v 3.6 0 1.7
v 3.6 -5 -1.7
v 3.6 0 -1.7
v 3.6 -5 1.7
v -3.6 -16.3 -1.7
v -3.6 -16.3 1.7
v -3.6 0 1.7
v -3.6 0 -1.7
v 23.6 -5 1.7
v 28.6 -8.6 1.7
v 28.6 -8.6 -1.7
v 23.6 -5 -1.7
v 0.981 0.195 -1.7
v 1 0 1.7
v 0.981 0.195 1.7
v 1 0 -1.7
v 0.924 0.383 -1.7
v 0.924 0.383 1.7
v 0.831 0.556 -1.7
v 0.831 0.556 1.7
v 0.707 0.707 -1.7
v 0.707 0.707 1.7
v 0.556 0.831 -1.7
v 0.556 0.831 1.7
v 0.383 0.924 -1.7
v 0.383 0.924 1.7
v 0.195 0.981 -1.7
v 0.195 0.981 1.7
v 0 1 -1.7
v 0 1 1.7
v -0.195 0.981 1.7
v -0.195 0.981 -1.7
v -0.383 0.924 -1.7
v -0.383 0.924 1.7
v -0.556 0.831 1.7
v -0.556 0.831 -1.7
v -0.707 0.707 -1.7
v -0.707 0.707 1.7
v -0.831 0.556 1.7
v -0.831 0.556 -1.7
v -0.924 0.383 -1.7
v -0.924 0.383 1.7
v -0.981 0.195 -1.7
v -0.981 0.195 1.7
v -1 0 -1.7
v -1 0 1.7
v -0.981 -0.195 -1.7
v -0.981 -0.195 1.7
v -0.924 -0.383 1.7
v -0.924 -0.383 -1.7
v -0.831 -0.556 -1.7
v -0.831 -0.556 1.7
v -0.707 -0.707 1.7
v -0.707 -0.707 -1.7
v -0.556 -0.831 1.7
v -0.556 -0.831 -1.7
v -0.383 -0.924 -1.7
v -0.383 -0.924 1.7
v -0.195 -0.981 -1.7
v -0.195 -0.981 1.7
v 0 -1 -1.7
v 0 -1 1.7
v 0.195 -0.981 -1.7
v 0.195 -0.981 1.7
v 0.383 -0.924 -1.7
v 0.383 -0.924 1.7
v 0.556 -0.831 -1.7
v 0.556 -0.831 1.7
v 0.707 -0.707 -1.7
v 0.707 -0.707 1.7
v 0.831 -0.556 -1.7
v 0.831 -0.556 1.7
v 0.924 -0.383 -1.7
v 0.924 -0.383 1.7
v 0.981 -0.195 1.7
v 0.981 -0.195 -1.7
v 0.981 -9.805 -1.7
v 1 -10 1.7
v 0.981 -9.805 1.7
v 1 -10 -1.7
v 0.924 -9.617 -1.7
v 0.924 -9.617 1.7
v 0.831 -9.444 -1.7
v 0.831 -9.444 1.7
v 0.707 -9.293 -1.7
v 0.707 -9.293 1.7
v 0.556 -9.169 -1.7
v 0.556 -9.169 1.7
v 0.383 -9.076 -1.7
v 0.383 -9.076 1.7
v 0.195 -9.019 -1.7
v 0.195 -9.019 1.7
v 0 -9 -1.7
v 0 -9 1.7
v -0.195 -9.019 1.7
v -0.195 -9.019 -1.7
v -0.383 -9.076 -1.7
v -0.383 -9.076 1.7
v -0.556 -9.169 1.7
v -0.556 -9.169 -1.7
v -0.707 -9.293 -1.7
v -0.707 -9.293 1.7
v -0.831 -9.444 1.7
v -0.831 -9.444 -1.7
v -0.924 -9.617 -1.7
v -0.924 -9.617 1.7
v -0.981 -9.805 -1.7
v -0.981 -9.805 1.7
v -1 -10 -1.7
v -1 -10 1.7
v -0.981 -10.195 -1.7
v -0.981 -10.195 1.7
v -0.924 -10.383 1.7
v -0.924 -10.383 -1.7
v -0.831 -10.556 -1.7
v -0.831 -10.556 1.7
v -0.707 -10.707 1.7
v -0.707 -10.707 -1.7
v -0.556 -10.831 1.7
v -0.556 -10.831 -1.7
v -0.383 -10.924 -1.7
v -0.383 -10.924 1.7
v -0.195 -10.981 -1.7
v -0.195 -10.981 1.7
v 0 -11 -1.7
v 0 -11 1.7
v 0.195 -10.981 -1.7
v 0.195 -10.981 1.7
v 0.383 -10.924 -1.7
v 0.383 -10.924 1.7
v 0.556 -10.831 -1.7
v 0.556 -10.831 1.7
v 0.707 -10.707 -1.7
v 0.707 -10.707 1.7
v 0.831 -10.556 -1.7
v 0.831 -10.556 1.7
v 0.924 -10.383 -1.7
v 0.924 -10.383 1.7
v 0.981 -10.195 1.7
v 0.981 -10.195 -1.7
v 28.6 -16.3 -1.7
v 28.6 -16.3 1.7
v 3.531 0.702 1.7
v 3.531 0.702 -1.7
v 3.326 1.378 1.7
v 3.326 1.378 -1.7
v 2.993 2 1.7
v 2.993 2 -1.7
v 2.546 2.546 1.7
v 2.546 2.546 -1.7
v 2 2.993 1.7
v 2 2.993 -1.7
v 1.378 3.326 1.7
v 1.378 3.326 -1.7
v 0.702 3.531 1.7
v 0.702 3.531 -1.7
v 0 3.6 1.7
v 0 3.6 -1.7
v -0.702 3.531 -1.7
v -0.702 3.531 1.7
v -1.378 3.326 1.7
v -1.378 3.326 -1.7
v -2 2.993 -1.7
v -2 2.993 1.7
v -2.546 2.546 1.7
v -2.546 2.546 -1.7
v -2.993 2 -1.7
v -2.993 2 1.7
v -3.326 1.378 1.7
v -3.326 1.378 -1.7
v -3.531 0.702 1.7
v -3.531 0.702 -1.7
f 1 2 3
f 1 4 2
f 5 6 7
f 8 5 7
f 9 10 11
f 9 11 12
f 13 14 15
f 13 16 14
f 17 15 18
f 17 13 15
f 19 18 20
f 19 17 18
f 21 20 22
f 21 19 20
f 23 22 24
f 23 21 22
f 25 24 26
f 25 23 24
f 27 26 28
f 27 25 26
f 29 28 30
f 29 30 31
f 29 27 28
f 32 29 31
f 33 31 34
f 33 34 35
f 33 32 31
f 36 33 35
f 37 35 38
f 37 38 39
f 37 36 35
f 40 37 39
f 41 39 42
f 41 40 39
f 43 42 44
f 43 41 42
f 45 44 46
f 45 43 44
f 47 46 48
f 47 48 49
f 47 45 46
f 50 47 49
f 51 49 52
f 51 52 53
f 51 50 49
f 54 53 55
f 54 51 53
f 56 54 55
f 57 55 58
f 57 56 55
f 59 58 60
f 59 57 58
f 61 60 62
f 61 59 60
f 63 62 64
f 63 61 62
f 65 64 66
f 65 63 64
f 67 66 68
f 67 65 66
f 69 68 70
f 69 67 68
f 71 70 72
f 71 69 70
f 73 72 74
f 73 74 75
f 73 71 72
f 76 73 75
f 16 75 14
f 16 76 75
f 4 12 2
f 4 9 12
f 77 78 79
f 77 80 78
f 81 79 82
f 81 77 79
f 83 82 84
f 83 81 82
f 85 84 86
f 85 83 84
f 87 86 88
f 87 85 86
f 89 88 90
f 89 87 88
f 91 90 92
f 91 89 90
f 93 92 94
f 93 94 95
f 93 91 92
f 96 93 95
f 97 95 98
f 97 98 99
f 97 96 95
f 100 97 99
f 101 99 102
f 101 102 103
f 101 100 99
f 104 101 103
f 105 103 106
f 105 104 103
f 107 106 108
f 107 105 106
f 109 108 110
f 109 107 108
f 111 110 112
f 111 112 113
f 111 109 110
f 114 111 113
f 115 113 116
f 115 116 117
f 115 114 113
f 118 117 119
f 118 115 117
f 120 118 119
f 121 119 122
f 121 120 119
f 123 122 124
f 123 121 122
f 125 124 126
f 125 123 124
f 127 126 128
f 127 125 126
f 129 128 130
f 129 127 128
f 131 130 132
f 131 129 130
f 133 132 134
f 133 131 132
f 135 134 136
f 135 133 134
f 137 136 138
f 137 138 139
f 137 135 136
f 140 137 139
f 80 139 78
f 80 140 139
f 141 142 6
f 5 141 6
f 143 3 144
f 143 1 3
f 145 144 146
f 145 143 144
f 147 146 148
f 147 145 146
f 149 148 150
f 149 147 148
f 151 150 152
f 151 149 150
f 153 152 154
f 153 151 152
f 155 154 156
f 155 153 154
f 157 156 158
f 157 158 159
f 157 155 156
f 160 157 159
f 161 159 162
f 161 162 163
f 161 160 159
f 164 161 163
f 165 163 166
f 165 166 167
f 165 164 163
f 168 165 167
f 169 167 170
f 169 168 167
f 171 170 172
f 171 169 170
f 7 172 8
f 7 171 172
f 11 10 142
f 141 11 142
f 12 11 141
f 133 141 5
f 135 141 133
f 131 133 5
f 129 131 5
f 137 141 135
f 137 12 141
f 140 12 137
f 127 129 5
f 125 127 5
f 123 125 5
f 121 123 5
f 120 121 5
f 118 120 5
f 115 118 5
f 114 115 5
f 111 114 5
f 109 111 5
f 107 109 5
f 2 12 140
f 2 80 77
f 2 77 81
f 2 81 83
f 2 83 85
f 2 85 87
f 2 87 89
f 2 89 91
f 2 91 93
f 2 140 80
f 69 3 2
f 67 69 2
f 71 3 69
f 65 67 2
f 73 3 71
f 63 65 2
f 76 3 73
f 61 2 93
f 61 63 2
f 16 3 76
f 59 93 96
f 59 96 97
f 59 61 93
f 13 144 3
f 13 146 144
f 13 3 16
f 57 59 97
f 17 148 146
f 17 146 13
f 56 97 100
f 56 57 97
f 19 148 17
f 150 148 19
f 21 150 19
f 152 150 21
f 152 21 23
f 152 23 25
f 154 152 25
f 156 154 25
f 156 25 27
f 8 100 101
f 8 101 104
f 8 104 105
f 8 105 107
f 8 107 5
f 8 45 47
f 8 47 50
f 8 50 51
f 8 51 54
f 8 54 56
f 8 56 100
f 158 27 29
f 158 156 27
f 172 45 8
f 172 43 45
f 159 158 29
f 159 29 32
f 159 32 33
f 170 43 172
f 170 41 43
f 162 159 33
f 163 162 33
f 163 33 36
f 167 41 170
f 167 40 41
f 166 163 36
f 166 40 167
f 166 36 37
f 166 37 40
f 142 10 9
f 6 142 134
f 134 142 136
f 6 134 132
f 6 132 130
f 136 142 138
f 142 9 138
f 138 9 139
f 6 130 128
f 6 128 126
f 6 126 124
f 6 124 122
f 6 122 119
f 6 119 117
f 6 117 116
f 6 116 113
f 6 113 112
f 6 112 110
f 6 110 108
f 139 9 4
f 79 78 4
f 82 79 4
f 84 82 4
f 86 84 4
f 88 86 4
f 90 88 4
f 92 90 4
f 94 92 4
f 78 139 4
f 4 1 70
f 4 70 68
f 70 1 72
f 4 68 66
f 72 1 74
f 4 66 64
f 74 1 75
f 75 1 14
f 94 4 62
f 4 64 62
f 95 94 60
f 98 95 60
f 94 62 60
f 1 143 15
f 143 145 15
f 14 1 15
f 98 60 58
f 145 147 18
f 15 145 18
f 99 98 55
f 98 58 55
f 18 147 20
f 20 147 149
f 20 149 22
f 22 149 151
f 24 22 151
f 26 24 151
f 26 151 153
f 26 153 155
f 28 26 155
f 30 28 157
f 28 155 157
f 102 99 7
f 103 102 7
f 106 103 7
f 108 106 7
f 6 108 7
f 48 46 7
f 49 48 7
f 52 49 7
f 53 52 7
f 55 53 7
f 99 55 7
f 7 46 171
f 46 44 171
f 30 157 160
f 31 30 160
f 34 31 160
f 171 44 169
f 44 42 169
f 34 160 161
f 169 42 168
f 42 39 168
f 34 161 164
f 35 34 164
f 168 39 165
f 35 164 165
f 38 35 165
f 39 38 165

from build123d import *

# Parameters (mm, degrees)
CROQUIS1_R              = 1
SALIENTE_EXTRUIR1_DEPTH = 1.7
CROQUIS3_W              = 15
CROQUIS3_H              = 10.99
SALIENTE_EXTRUIR2_DEPTH = 3.4
CROQUIS4_W              = 15
CROQUIS4_H              = 3.4
CORTAR_EXTRUIR1_DEPTH   = 10.99
SALIENTE_EXTRUIR3_DEPTH = 3.4


with BuildPart() as part:
    # Croquis1 → Saliente-Extruir1 (new, symmetric)
    with BuildSketch(Plane.XY):
        with BuildLine():
            Line((-3.6, 0), (-3.6, -10))
            ThreePointArc((-3.6, -10), (-2.545584412, -12.545584412), (0, -13.6))
            Line((0, -13.6), (28.6, -13.6))
            Line((28.6, -13.6), (28.6, -8.6))
            Line((28.6, -8.6), (23.6, -5))
            Line((23.6, -5), (3.6, -5))
            Line((3.6, -5), (3.6, 0))
            ThreePointArc((3.6, 0), (0, 3.6), (-3.6, 0))
        make_face()
        Circle(CROQUIS1_R, mode=Mode.SUBTRACT)
        with Locations((0, -10)):
            Circle(CROQUIS1_R, mode=Mode.SUBTRACT)
    extrude(amount=SALIENTE_EXTRUIR1_DEPTH, both=True)

    # Croquis3 → Saliente-Extruir2 (add)
    with BuildSketch(Plane(origin=(0, 0, -1.7), x_dir=(-1, 0, 0), z_dir=(0, 0, -1))):
        with Locations((-21.1, -19.095)):
            Rectangle(CROQUIS3_W, CROQUIS3_H)
    extrude(amount=-SALIENTE_EXTRUIR2_DEPTH)

    # Croquis4 → Cortar-Extruir1 (cut)
    with BuildSketch(Plane.XZ.offset(24.59)):
        with Locations((21.1, 0)):
            Rectangle(CROQUIS4_W, CROQUIS4_H)
    extrude(amount=-CORTAR_EXTRUIR1_DEPTH, mode=Mode.SUBTRACT)

    # Croquis5 → Saliente-Extruir3 (add)
    with BuildSketch(Plane.XY.offset(1.7)):
        with BuildLine():
            Line((28.6, -13.6), (28.6, -16.3))
            Line((28.6, -16.3), (-3.6, -16.3))
            Line((-3.6, -16.3), (-3.6, -10))
            ThreePointArc((-3.6, -10), (-2.545584412, -12.545584412), (0, -13.6))
            Line((0, -13.6), (28.6, -13.6))
        make_face()
    extrude(amount=-SALIENTE_EXTRUIR3_DEPTH)


solid = part.part
